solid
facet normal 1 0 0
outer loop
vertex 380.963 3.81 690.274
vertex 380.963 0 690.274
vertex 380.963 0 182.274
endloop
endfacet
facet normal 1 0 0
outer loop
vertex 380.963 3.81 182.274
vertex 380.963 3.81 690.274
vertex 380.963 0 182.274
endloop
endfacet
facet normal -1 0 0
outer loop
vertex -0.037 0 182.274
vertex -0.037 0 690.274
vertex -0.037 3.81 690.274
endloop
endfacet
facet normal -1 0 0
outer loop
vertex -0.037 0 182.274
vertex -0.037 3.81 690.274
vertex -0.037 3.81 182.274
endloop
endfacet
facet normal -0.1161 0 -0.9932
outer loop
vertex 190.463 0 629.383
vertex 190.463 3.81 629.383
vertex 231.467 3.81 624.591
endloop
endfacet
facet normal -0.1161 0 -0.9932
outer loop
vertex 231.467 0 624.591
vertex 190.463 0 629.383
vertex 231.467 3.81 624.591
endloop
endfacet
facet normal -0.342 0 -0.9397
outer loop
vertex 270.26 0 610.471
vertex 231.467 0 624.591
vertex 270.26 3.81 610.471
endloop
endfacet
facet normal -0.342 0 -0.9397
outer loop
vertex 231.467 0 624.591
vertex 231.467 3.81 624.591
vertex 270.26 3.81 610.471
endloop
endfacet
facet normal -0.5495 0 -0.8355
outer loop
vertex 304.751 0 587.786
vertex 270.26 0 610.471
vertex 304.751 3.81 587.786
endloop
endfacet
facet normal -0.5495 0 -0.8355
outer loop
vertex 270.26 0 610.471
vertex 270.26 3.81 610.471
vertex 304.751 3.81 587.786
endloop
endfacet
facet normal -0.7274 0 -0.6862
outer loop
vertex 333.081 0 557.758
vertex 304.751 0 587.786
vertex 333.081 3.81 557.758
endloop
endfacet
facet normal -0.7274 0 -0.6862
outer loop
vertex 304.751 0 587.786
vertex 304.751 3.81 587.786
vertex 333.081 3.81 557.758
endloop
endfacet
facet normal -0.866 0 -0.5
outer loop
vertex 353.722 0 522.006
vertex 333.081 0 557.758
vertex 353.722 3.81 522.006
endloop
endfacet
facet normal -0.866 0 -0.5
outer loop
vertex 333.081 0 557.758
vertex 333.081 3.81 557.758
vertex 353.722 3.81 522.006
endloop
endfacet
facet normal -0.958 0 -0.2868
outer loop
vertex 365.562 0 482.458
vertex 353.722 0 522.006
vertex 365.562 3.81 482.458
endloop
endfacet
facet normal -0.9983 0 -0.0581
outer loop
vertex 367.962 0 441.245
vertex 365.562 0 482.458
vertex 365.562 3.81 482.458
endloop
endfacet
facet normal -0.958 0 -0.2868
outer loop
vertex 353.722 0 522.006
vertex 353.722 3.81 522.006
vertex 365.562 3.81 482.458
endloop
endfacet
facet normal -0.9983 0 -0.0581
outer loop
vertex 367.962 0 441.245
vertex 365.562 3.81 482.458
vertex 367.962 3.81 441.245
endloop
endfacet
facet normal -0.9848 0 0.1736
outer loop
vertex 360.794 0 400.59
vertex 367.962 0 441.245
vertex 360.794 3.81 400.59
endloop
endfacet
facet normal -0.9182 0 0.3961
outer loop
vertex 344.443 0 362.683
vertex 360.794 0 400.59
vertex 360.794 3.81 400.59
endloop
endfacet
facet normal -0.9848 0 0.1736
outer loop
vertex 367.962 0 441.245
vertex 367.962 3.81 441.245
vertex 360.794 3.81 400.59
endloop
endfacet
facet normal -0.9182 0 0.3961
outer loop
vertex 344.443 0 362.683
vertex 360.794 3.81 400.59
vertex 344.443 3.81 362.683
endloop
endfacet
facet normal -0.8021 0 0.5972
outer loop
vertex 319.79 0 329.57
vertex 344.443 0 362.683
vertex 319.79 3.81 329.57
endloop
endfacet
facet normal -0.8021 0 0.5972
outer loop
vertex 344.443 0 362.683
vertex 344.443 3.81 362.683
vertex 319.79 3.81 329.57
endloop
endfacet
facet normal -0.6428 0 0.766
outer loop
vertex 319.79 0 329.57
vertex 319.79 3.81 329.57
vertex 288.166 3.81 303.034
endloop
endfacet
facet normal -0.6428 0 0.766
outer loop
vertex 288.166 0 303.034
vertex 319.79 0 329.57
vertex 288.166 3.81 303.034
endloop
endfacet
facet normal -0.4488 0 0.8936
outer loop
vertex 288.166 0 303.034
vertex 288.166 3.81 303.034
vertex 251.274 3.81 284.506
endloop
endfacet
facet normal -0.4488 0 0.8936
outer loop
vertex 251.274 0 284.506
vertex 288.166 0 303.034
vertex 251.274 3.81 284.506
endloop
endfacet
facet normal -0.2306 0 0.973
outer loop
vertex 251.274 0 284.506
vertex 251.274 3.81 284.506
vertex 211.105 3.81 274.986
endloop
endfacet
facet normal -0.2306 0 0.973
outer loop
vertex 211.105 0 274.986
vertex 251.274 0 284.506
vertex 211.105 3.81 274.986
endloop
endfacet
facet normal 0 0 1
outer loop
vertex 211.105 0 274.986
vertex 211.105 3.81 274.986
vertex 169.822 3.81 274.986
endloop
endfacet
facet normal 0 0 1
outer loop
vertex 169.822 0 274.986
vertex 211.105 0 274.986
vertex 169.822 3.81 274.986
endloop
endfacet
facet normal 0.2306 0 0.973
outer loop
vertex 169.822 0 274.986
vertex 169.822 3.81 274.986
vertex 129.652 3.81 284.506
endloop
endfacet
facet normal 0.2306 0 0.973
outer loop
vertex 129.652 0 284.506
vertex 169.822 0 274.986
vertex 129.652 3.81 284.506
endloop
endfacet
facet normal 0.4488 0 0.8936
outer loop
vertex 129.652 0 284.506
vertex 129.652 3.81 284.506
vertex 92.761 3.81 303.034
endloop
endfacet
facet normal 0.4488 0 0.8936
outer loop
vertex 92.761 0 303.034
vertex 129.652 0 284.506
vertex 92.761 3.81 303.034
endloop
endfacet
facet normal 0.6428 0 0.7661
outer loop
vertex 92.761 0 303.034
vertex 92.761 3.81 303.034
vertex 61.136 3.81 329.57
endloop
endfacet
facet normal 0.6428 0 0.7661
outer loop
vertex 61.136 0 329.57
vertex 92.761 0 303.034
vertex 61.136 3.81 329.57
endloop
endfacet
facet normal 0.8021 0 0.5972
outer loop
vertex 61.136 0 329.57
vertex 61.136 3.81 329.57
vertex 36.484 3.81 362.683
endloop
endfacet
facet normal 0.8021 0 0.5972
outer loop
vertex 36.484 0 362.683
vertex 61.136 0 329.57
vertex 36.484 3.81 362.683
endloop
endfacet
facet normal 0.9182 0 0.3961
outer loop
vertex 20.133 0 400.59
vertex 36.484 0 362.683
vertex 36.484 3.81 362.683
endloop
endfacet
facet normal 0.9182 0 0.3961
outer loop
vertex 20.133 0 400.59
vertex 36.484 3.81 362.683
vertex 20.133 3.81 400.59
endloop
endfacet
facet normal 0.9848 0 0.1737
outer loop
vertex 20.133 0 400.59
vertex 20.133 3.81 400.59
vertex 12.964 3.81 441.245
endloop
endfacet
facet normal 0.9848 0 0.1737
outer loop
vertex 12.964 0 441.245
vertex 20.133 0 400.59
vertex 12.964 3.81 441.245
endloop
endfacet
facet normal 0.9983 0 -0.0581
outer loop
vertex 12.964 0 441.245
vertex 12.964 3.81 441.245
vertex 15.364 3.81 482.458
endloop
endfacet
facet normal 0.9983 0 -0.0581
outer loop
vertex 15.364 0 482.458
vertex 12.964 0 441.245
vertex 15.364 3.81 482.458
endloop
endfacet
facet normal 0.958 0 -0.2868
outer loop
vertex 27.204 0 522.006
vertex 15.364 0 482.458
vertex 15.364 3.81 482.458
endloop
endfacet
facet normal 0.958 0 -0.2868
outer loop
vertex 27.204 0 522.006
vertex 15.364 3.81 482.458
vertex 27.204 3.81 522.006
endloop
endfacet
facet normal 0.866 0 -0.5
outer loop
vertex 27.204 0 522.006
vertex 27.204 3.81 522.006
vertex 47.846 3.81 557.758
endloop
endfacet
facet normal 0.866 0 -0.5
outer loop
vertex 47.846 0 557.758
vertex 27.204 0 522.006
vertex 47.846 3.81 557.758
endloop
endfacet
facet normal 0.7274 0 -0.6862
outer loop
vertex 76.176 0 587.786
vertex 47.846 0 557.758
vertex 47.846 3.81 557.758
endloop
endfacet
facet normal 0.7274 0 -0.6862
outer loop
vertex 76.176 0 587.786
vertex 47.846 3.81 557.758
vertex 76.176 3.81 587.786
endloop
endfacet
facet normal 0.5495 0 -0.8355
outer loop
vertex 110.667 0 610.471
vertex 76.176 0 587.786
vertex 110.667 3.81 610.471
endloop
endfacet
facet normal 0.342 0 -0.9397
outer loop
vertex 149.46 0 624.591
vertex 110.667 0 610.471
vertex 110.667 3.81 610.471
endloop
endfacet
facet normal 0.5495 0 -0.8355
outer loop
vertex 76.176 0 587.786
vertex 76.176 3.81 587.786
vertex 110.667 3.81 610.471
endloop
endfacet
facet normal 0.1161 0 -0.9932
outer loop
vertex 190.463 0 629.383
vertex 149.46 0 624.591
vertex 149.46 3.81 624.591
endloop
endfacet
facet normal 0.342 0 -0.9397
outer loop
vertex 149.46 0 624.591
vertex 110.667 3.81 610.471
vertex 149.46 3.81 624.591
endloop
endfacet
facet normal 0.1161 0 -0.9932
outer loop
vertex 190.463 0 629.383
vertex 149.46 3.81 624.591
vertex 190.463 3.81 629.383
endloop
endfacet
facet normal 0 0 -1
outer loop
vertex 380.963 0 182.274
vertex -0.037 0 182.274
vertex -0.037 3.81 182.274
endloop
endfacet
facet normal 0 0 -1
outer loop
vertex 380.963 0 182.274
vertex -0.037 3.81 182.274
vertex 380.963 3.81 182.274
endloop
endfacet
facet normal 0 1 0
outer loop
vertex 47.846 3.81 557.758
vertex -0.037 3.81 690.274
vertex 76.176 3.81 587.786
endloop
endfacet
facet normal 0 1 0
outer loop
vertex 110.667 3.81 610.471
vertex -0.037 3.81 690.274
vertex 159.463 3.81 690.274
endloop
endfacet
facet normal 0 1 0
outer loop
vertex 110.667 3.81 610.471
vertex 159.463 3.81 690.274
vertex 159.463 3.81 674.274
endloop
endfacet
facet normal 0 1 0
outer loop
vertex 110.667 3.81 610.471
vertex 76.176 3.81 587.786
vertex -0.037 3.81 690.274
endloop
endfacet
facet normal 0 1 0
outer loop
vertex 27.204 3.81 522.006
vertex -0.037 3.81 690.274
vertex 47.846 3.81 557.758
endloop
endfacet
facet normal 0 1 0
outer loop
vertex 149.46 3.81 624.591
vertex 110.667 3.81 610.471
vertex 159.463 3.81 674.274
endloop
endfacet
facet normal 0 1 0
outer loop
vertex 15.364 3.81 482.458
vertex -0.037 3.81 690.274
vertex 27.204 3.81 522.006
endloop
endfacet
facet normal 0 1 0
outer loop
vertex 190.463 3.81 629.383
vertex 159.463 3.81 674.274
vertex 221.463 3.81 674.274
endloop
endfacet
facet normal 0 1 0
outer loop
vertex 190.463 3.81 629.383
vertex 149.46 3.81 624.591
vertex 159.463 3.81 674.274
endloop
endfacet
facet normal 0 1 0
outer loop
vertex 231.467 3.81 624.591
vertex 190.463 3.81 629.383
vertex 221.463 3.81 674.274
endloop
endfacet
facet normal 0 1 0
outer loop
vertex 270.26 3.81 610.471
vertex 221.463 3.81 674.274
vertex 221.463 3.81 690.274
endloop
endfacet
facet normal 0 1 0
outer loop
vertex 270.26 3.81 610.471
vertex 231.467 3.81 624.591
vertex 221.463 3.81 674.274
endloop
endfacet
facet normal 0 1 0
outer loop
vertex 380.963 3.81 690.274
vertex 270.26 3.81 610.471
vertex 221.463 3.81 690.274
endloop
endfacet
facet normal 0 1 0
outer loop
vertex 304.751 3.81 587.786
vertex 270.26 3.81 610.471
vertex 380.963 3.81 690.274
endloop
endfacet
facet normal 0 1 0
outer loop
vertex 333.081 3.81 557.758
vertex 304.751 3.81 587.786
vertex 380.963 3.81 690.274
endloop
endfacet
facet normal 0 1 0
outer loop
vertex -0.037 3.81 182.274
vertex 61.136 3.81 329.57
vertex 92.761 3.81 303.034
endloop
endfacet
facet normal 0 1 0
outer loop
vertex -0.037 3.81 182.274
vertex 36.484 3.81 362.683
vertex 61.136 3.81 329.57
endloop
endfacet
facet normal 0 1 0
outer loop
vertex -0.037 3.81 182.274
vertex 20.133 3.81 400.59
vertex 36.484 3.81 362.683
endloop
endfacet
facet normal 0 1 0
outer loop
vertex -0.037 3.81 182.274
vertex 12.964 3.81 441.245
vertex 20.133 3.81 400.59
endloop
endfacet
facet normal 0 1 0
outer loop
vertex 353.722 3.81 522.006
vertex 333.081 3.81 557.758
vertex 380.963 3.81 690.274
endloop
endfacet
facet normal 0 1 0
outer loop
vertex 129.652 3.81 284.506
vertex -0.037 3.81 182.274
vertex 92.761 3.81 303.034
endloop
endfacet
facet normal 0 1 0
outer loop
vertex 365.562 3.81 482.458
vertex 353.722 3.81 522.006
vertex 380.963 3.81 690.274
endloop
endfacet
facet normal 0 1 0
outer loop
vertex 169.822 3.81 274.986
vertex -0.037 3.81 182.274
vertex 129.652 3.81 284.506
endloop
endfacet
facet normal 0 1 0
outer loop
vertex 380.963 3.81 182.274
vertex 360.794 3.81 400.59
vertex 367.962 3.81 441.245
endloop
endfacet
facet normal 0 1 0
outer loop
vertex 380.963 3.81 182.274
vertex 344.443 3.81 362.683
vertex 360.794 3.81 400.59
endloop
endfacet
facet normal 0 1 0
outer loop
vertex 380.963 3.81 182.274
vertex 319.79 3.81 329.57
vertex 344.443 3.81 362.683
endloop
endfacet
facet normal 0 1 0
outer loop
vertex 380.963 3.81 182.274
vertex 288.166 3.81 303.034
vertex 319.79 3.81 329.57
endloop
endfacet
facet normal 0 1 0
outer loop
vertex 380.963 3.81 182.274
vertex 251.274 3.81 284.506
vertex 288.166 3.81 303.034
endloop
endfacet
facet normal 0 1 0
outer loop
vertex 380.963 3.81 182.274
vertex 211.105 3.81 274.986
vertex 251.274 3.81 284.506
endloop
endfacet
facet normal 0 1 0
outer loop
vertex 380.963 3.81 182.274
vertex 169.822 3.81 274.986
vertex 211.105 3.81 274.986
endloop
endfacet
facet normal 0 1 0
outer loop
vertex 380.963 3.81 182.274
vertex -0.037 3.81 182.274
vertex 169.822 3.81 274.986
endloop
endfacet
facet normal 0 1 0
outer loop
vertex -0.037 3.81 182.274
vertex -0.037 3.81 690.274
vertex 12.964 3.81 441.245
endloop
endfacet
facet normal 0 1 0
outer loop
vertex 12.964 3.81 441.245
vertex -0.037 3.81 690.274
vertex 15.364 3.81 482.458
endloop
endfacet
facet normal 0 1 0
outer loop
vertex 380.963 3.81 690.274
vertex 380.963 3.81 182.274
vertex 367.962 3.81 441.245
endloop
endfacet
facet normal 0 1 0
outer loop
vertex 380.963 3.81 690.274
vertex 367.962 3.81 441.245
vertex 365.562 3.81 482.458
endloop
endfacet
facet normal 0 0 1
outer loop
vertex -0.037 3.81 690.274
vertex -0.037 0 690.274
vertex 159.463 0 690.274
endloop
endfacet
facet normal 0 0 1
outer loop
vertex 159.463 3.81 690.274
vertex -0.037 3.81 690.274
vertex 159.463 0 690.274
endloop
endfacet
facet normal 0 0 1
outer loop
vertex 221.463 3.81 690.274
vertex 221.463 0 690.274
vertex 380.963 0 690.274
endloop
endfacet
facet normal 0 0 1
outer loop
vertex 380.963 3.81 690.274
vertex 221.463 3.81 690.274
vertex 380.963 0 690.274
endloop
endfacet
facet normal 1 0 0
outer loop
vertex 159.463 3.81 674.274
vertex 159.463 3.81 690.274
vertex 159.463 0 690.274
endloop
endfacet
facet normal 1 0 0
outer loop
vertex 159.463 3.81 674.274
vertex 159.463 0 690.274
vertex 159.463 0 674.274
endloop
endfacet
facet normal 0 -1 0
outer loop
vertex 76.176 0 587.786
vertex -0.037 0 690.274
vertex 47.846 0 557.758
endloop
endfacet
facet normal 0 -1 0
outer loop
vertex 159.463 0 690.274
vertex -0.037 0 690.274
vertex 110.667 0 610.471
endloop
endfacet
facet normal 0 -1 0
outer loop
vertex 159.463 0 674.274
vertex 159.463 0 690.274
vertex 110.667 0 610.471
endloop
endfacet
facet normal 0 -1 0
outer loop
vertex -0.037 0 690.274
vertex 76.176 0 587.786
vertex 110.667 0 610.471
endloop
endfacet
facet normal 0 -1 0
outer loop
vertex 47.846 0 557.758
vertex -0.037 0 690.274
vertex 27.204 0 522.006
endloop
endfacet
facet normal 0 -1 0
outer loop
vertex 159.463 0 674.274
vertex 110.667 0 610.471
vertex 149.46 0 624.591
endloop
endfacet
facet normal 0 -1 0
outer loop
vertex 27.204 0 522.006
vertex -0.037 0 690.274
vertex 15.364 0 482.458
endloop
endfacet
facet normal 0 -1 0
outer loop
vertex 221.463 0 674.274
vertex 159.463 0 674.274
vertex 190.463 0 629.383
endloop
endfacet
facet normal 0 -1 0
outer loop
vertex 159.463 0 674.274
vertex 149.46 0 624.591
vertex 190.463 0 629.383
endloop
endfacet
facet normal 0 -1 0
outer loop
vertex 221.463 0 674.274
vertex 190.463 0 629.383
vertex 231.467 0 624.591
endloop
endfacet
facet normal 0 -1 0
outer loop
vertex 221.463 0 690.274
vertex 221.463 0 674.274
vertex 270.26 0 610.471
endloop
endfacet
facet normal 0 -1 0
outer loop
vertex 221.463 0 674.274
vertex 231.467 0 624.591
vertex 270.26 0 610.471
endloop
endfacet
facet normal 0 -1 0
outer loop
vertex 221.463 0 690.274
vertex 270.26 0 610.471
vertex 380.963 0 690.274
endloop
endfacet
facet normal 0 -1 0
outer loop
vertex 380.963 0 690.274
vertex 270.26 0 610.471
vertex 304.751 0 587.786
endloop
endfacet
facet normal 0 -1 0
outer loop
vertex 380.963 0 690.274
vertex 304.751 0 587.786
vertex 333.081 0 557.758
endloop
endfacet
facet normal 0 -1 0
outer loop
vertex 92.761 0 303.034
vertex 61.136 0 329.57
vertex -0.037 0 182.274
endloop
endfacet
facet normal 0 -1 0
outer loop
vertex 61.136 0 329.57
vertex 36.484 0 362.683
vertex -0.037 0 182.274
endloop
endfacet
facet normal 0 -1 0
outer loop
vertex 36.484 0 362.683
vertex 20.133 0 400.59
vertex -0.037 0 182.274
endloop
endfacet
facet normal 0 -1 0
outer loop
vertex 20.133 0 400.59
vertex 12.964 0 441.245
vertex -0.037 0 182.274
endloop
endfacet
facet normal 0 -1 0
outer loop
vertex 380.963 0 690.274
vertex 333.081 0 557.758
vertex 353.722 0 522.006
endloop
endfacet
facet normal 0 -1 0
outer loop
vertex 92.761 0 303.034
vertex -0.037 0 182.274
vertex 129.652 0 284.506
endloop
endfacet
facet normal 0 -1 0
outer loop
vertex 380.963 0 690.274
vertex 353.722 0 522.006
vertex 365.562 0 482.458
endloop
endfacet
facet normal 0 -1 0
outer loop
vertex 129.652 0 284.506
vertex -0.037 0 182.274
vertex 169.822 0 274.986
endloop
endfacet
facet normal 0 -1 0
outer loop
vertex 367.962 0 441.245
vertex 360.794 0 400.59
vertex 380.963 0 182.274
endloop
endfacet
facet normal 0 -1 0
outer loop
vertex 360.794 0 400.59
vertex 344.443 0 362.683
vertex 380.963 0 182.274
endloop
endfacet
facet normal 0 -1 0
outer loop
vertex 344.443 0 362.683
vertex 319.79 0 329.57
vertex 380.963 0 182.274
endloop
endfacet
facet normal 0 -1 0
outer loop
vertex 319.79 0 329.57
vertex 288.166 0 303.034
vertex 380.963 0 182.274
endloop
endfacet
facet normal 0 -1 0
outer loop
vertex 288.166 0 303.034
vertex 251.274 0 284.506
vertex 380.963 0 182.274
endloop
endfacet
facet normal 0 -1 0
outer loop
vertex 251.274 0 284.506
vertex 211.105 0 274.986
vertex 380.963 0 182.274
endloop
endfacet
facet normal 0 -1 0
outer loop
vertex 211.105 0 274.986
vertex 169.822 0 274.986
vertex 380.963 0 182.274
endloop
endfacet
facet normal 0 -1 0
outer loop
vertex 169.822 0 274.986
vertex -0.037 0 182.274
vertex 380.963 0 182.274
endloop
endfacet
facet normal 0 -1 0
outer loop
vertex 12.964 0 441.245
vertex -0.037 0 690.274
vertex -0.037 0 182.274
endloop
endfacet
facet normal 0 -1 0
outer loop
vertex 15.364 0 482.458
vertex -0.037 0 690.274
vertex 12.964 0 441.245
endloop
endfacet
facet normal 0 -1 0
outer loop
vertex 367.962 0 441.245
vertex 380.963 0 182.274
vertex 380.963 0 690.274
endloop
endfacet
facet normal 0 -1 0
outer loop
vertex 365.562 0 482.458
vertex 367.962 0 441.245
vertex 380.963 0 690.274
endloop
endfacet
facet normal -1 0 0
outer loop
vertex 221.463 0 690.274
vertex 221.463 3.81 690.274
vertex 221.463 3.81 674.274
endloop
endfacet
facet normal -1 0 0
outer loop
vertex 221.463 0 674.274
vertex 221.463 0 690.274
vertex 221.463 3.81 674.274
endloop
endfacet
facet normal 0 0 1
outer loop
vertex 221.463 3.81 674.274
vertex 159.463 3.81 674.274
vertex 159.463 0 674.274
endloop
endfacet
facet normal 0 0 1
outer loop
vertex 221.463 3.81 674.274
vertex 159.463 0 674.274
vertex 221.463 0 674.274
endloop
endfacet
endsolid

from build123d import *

# Parameters (mm, degrees)
SKETCH4_W           = 381
SKETCH4_H           = 508
BOSS_EXTRUDE1_DEPTH = 3.81
SKETCH5_R           = 177.8
CUT_EXTRUDE1_DEPTH  = 789.432041398
SKETCH6_W           = 62
SKETCH6_H           = 16
CUT_EXTRUDE2_DEPTH  = 789.432041398


with BuildPart() as part:
    # Sketch4 → Boss-Extrude1 (new body)
    with BuildSketch(Plane(origin=(190.463297595, 0, 436.273520924), x_dir=(1, 0, 0), z_dir=(0, 1, 0))):
        Rectangle(SKETCH4_W, SKETCH4_H)
    extrude(amount=BOSS_EXTRUDE1_DEPTH)

    # Sketch5 → Cut-Extrude1 (cut, through all)
    with BuildSketch(Plane(origin=(0, 3.81, 0), x_dir=(1, 0, 0), z_dir=(0, 1, 0))):
        with Locations(Location((190.463297595, -451.583397082, 0), (0, 0, 270))):
            Circle(SKETCH5_R)
    extrude(amount=-CUT_EXTRUDE1_DEPTH, mode=Mode.SUBTRACT)

    # Sketch6 → Cut-Extrude2 (cut, through all)
    with BuildSketch(Plane(origin=(0, 3.81, 0), x_dir=(1, 0, 0), z_dir=(0, 1, 0))):
        with Locations((190.463297595, -682.273520924)):
            Rectangle(SKETCH6_W, SKETCH6_H)
    extrude(amount=-CUT_EXTRUDE2_DEPTH, mode=Mode.SUBTRACT)


solid = part.part
